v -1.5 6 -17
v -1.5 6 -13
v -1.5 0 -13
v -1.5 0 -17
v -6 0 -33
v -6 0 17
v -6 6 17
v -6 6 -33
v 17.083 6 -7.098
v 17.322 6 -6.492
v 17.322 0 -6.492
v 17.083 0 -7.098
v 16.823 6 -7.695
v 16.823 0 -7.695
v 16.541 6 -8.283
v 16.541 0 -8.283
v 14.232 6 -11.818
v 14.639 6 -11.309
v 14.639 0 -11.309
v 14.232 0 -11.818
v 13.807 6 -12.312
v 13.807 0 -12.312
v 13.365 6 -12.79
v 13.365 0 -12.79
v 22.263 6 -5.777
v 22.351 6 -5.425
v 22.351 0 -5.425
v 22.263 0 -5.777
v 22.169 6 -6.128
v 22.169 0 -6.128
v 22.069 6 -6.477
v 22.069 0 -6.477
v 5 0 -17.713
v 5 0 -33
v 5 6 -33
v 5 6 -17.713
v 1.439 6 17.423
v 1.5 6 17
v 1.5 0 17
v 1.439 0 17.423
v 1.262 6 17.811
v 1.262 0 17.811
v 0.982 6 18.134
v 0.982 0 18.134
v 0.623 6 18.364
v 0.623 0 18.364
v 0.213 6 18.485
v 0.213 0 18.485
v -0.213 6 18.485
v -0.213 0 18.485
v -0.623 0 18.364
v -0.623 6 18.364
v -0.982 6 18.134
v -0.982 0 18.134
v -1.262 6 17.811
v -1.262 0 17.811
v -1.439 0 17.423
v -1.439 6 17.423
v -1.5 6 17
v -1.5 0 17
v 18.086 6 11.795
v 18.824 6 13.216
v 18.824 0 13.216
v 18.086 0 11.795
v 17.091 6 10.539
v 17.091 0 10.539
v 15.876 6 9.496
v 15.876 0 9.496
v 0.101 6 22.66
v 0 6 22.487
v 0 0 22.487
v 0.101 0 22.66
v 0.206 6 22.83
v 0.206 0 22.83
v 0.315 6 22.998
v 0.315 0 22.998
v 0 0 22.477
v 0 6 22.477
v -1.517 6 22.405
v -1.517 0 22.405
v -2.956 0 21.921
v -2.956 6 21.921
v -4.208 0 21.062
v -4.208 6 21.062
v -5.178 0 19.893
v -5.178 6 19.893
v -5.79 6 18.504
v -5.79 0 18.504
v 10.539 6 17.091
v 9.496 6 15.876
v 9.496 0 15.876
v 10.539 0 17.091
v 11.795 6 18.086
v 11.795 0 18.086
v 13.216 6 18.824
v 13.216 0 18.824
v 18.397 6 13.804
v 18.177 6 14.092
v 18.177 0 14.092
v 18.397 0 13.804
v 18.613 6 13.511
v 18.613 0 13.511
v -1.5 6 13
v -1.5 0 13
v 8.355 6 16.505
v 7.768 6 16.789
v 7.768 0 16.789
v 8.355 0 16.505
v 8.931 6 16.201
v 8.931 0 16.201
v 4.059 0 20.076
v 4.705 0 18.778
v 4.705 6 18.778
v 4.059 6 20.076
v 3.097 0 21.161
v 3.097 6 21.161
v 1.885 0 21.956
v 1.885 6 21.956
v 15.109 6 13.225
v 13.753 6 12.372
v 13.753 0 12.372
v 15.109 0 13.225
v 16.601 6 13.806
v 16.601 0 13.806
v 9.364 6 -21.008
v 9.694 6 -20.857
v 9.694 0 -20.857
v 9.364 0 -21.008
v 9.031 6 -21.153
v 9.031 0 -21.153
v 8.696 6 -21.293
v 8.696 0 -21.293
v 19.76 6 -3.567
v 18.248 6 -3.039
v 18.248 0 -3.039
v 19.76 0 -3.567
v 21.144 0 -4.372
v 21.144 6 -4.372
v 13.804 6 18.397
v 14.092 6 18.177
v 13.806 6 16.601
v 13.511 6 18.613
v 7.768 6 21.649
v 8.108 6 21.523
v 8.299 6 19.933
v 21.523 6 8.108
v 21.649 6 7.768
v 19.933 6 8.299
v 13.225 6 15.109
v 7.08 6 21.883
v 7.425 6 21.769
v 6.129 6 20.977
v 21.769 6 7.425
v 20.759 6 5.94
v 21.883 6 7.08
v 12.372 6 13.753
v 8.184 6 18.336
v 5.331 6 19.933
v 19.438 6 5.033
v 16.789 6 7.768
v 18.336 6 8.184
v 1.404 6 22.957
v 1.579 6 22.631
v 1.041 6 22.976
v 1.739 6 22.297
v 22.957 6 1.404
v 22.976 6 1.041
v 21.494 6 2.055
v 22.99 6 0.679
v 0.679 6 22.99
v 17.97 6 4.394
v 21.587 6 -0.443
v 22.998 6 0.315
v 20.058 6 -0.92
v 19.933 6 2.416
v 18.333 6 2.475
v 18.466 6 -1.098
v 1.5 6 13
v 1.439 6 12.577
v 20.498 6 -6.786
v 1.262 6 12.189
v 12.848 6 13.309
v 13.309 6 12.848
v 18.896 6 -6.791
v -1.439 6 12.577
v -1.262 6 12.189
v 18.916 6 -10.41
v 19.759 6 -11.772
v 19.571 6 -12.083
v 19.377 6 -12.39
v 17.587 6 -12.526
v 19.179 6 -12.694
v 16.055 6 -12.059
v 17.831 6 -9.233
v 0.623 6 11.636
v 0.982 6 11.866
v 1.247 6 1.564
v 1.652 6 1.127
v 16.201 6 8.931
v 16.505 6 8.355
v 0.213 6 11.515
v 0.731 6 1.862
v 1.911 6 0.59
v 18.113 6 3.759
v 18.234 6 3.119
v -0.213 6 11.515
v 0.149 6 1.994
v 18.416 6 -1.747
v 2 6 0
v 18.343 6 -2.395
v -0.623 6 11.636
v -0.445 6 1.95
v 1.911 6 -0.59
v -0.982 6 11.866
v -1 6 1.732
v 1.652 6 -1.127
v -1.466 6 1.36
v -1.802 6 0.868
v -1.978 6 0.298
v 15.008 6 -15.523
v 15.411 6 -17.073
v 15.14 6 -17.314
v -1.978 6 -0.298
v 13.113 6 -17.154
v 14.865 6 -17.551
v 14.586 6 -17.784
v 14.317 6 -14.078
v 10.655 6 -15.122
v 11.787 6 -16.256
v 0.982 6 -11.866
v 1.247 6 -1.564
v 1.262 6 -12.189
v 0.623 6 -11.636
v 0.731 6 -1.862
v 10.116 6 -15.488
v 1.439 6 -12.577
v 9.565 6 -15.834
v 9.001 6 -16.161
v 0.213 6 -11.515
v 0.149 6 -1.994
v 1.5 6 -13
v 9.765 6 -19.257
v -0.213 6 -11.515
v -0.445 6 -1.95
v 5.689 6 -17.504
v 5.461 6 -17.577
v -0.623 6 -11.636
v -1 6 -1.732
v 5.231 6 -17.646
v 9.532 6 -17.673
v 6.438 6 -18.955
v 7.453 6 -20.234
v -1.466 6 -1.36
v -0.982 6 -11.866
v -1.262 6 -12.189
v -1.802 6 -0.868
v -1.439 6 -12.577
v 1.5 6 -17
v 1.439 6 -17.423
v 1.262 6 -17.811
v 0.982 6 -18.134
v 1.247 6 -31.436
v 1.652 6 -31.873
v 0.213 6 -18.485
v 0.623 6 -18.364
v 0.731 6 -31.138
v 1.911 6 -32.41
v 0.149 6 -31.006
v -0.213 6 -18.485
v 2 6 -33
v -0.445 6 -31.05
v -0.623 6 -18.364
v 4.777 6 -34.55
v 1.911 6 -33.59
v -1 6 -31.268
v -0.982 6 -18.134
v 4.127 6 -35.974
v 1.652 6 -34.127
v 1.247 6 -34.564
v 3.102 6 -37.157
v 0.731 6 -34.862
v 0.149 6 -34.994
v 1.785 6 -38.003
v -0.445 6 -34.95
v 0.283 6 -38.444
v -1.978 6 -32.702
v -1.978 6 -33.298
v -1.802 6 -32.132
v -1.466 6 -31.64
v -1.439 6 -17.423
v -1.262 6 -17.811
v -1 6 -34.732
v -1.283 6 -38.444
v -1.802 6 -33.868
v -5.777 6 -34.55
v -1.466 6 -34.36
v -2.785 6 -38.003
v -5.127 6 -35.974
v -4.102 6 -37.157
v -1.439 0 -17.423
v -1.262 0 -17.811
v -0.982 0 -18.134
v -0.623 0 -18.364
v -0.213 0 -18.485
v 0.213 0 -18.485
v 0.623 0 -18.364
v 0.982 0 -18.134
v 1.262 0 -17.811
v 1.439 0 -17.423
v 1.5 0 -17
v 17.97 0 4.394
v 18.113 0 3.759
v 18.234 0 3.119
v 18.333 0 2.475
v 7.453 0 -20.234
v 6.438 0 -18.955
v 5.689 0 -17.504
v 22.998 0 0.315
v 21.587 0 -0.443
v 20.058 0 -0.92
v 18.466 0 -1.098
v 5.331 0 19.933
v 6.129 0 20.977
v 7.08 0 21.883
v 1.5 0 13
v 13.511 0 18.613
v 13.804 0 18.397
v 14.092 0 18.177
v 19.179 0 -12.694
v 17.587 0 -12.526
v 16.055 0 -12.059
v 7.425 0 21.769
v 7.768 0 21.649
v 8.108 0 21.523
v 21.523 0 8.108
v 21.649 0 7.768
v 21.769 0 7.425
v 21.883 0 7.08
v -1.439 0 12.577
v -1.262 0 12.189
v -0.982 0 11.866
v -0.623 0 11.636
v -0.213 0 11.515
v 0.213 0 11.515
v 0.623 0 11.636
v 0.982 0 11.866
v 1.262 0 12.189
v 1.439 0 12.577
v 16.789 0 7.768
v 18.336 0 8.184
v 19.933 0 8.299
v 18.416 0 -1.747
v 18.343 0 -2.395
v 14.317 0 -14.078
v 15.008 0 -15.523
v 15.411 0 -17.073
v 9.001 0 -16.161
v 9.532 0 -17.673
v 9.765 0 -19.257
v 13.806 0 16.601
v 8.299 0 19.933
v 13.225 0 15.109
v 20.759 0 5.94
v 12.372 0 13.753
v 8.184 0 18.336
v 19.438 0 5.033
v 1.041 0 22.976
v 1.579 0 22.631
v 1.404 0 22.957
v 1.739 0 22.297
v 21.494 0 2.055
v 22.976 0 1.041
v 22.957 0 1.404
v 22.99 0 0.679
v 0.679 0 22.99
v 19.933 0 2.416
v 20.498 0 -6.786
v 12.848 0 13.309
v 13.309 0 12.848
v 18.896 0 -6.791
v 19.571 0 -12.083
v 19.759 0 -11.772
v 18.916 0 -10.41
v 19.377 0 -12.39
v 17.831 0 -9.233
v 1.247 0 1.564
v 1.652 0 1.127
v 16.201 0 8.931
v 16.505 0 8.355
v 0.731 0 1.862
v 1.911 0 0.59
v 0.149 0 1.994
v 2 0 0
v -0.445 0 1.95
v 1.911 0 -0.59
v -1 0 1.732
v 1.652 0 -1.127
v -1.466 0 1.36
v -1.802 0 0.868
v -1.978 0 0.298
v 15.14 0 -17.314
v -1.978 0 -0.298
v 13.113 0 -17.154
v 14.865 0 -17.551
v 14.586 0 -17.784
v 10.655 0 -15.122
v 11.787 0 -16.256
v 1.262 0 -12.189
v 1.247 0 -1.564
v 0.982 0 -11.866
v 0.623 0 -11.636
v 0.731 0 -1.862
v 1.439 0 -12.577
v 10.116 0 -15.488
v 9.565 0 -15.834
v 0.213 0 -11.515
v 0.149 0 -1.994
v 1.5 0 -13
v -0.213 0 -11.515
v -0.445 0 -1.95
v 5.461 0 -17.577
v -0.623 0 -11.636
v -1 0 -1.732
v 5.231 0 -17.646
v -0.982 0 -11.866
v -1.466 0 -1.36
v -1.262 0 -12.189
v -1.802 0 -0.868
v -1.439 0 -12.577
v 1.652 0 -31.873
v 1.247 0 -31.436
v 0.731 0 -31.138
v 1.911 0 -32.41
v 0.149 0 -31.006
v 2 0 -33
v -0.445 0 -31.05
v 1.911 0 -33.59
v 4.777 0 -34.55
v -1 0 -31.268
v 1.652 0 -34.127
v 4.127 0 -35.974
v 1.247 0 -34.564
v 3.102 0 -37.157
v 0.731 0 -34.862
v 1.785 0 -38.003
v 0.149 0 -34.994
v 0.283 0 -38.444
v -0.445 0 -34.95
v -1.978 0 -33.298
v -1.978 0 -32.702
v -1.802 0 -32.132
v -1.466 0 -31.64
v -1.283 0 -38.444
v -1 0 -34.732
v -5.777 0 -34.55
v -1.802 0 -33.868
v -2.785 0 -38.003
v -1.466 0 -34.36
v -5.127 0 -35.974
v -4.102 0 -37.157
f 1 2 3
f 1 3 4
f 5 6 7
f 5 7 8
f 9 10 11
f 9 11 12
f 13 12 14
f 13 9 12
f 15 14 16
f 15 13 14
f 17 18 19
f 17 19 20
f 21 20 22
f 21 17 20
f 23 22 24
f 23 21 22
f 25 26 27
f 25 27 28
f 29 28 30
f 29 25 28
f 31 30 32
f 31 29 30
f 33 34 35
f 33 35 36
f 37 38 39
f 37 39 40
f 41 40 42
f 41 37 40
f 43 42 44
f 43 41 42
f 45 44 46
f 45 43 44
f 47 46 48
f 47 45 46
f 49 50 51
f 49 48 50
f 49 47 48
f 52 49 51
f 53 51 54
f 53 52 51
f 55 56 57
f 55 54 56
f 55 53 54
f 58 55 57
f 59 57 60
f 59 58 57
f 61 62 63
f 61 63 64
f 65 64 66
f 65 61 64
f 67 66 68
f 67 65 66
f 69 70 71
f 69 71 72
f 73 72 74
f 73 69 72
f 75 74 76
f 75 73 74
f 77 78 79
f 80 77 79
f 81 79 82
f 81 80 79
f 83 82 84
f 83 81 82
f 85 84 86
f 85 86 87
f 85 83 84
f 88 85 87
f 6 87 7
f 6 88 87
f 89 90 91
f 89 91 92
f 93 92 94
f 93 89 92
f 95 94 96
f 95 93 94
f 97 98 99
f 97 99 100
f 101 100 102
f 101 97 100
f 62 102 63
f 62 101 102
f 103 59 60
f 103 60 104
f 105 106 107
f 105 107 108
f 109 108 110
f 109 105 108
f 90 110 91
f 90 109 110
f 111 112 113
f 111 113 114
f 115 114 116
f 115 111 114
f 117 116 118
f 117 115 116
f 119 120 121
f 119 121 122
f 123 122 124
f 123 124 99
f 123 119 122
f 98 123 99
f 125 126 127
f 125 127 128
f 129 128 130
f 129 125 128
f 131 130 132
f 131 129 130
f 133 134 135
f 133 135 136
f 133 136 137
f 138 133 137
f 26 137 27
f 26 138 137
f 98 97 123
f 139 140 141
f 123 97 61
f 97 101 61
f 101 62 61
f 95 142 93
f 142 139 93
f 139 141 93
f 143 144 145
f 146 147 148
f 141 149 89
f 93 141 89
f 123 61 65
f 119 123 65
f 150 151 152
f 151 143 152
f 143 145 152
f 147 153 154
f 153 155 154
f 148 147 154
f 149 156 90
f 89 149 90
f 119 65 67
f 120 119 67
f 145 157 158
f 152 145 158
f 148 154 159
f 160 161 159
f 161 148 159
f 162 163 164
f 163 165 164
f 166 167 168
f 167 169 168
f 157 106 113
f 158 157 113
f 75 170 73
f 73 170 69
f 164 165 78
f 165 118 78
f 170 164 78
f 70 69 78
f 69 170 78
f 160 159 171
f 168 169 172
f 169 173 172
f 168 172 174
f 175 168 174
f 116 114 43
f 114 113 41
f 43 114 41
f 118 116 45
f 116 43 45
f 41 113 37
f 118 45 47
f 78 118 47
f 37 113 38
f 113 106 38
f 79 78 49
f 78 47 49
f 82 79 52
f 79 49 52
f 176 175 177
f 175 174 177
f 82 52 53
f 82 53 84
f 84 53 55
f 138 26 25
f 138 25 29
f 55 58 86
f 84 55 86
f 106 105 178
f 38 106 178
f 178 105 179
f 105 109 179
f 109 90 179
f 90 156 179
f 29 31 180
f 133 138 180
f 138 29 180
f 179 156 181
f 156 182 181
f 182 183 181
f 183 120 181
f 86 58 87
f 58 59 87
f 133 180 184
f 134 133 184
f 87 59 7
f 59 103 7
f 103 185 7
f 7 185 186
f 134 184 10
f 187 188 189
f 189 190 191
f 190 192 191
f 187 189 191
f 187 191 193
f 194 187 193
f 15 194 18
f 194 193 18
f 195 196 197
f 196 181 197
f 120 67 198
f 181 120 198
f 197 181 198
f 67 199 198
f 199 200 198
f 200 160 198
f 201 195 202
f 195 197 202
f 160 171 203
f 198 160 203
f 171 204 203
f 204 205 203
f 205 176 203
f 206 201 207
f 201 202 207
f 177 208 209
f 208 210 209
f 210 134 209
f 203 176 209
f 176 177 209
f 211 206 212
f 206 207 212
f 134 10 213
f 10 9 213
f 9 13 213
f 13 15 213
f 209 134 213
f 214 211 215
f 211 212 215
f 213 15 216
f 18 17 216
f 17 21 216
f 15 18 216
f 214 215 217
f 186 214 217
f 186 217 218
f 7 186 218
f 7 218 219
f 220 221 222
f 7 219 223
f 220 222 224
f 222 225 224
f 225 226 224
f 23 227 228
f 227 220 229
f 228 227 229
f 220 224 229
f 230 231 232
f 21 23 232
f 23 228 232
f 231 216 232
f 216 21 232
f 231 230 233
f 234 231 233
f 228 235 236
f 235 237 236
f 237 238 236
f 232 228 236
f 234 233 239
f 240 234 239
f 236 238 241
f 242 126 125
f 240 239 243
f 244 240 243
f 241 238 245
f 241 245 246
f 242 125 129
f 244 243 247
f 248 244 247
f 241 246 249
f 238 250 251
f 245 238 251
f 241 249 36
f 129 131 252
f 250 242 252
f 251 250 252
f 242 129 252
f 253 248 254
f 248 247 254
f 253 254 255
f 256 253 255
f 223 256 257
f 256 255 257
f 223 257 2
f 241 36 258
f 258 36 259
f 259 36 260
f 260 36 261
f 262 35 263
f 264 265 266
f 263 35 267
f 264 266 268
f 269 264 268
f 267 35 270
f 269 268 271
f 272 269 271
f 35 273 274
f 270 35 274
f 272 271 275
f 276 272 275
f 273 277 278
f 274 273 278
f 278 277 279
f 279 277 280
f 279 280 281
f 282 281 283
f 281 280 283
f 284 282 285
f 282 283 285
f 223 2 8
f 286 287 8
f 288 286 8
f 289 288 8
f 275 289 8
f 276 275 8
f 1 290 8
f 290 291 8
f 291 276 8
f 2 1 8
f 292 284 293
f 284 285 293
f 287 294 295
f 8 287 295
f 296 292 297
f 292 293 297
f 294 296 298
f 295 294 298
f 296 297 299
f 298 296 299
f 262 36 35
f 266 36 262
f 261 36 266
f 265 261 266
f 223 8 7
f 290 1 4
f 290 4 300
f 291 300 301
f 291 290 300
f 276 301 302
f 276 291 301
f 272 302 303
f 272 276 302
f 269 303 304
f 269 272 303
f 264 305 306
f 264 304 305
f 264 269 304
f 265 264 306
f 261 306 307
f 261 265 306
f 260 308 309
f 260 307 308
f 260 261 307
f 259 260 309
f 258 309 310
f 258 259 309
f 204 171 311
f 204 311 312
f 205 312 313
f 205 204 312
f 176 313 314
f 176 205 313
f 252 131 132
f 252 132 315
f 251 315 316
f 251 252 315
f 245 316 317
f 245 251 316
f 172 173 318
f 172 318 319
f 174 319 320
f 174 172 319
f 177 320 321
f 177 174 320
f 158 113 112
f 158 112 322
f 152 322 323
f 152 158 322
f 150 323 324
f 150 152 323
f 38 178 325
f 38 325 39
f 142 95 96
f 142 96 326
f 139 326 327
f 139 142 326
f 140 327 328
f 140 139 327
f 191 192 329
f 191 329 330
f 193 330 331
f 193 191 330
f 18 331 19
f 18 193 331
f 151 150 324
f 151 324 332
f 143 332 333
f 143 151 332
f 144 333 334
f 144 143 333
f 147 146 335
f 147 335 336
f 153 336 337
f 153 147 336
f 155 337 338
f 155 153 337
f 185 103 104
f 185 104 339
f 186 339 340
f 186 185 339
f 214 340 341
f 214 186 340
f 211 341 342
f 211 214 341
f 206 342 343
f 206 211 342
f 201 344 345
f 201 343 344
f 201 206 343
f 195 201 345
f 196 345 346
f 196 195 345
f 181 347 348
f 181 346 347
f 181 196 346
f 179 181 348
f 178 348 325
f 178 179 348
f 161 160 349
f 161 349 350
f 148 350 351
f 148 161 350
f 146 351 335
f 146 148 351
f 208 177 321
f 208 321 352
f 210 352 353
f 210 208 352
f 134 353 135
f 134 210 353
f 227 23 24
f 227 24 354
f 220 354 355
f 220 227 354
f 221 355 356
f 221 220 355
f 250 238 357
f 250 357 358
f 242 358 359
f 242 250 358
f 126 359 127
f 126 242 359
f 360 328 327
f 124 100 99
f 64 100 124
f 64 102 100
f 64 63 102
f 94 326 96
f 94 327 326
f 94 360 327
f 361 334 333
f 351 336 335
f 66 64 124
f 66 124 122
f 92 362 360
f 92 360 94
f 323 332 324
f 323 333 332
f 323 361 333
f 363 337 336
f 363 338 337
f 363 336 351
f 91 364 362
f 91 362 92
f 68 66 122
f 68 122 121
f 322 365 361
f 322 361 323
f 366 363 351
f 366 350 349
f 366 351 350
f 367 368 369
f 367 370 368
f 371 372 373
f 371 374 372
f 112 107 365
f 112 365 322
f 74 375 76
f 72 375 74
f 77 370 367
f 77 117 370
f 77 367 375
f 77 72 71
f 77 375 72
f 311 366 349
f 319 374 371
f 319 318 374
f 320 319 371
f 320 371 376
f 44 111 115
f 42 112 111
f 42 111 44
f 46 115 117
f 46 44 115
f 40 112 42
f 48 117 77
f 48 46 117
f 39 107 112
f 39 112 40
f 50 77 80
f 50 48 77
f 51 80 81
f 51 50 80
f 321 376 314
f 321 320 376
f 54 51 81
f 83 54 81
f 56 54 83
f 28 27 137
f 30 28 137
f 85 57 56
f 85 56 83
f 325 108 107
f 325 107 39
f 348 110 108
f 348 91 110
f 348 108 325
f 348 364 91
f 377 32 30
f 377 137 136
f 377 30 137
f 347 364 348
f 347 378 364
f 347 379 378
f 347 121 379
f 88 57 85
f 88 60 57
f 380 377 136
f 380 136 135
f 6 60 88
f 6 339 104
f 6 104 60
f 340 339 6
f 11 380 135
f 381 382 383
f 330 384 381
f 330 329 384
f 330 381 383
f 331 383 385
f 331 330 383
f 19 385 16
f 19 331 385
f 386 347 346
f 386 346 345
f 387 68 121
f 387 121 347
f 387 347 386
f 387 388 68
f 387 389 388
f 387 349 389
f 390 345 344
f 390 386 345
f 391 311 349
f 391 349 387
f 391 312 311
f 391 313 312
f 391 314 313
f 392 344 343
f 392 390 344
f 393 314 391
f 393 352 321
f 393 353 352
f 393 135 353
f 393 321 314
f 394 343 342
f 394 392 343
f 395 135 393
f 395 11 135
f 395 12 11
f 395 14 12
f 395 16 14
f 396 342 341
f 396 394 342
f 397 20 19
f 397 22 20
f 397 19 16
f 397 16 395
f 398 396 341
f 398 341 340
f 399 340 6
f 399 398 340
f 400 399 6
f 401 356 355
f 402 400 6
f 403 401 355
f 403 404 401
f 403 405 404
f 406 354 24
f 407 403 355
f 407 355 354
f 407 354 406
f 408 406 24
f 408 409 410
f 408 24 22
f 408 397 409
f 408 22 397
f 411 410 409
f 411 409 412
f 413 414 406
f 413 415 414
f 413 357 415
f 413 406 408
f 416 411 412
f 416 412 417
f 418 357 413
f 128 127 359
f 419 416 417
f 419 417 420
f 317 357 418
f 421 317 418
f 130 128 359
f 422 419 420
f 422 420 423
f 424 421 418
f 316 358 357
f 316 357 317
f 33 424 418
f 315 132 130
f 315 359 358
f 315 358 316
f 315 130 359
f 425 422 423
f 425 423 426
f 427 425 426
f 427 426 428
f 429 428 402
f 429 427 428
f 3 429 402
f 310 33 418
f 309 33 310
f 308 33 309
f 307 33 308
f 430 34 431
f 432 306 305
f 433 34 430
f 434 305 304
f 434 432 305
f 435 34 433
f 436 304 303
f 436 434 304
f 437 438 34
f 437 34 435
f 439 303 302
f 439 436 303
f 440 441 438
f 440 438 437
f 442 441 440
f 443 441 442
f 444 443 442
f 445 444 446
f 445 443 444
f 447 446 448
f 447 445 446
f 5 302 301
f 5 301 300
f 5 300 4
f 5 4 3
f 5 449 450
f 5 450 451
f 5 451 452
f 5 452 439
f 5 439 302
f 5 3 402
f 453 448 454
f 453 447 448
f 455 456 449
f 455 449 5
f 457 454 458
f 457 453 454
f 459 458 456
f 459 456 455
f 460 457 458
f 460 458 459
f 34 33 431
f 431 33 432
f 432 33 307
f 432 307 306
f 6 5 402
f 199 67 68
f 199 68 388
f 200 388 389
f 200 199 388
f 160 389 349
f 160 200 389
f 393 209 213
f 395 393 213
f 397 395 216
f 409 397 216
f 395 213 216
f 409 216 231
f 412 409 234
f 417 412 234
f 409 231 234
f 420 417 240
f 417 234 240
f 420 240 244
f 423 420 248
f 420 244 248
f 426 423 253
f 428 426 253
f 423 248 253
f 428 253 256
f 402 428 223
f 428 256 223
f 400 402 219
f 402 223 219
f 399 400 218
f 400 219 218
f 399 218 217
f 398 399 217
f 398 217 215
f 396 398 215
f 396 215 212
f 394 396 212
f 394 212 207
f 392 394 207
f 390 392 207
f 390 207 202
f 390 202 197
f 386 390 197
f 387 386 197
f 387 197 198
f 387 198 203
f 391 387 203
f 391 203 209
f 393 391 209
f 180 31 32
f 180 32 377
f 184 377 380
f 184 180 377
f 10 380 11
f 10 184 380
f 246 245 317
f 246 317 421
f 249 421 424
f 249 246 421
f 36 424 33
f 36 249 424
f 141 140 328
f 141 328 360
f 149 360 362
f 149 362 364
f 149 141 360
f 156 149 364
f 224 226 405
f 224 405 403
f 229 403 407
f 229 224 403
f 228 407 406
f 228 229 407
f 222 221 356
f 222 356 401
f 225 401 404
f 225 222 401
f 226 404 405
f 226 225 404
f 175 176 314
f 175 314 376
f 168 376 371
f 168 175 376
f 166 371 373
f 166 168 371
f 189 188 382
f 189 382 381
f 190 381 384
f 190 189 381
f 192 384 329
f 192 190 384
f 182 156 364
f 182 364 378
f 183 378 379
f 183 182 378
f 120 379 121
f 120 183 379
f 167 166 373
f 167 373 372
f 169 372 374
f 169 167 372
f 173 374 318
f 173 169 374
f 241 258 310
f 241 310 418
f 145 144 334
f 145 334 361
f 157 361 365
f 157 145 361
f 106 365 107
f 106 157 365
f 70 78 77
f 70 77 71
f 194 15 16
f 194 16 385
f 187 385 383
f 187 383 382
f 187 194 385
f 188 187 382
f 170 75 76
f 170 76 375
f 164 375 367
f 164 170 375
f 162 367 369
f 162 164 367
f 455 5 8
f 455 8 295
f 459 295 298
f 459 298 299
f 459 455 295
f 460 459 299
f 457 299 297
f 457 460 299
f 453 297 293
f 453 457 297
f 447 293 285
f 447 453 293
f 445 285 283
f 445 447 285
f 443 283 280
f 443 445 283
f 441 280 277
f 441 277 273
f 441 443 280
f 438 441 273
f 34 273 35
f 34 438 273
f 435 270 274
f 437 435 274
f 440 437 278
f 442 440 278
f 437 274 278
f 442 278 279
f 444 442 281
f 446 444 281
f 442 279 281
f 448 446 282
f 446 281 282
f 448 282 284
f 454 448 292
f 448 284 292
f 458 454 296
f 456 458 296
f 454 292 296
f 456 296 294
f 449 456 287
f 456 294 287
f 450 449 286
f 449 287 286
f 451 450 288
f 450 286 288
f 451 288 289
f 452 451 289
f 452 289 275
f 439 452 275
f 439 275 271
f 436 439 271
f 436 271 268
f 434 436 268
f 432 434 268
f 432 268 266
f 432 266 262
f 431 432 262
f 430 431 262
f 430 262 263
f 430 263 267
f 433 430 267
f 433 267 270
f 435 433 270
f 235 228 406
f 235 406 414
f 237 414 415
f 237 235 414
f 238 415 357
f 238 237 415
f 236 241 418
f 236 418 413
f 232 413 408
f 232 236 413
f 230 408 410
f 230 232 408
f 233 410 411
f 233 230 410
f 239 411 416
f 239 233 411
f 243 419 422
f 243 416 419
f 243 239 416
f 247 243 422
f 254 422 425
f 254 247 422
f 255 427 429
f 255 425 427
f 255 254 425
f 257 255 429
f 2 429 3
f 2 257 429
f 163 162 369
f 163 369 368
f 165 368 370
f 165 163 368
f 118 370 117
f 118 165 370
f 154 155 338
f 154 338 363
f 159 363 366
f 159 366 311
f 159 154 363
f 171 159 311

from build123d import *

# Parameters (mm, degrees)
BOSS_EXTRUDE1_DEPTH = 6
BOSS_EXTRUDE2_DEPTH = 6
SKETCH2_R           = 2
CUT_EXTRUDE1_DEPTH  = 7


with BuildPart() as part:
    # Sketch1 → Boss-Extrude1 (new body)
    with BuildSketch(Plane(origin=(0, 0, 0), x_dir=(1, 0, 0), z_dir=(0, 1, 0))):
        with BuildLine():
            Line((5, 33), (5, 0))
            Line((5, 0), (5, -17))
            ThreePointArc((5, -17), (-0.5, -22.5), (-6, -17))
            Line((-6, -17), (-6, 0))
            Line((-6, 0), (-6, 33))
            ThreePointArc((-6, 33), (-0.5, 38.5), (5, 33))
        make_face()
    extrude(amount=BOSS_EXTRUDE1_DEPTH)

    # Sketch4 → Boss-Extrude2 (add)
    with BuildSketch(Plane(origin=(0, 6, 0), x_dir=(1, 0, 0), z_dir=(0, 1, 0))):
        with BuildLine():
            Line((0, 18.405260039), (0, -22.486700485))
            ThreePointArc((0, -22.486700485), (0.153171428, -22.74508915), (0.315483204, -22.99783621))
            ThreePointArc((0.315483204, -22.99783621), (0.859997468, -22.98391621), (1.404029403, -22.957105685))
            ThreePointArc((1.404029403, -22.957105685), (2.272765962, -20.722115477), (2.474630782, -18.332735843))
            ThreePointArc((2.474630782, -18.332735843), (3.439178821, -18.176497188), (4.39413166, -17.969546682))
            ThreePointArc((4.39413166, -17.969546682), (5.454980724, -20.120007959), (7.080198393, -21.883116568))
            ThreePointArc((7.080198393, -21.883116568), (7.596418425, -21.709316597), (8.108378007, -21.52334096))
            ThreePointArc((8.108378007, -21.52334096), (8.279744109, -19.1315805), (7.76835863, -16.7888536))
            ThreePointArc((7.76835863, -16.7888536), (8.644002354, -16.355250664), (9.495529586, -15.876017098))
            ThreePointArc((9.495529586, -15.876017098), (11.143107691, -17.618248663), (13.215806885, -18.823985986))
            ThreePointArc((13.215806885, -18.823985986), (13.657864268, -18.505748935), (14.092261641, -18.177132938))
            ThreePointArc((14.092261641, -18.177132938), (13.551030657, -15.841120639), (12.371833724, -13.753208037))
            ThreePointArc((12.371833724, -13.753208037), (13.080768345, -13.080768345), (13.753208037, -12.371833724))
            ThreePointArc((13.753208037, -12.371833724), (15.841120639, -13.551030657), (18.177132938, -14.092261641))
            ThreePointArc((18.177132938, -14.092261641), (18.505748935, -13.657864268), (18.823985986, -13.215806885))
            ThreePointArc((18.823985986, -13.215806885), (17.618248663, -11.143107691), (15.876017098, -9.495529586))
            ThreePointArc((15.876017098, -9.495529586), (16.355250664, -8.644002354), (16.7888536, -7.76835863))
            ThreePointArc((16.7888536, -7.76835863), (19.1315805, -8.279744109), (21.52334096, -8.108378007))
            ThreePointArc((21.52334096, -8.108378007), (21.709316597, -7.596418425), (21.883116568, -7.080198393))
            ThreePointArc((21.883116568, -7.080198393), (20.120007959, -5.454980724), (17.969546682, -4.39413166))
            ThreePointArc((17.969546682, -4.39413166), (18.176497188, -3.439178821), (18.332735843, -2.474630782))
            ThreePointArc((18.332735843, -2.474630782), (20.722115477, -2.272765962), (22.957105685, -1.404029403))
            ThreePointArc((22.957105685, -1.404029403), (22.98391621, -0.859997468), (22.99783621, -0.315483204))
            ThreePointArc((22.99783621, -0.315483204), (20.834016252, 0.717845219), (18.466403185, 1.097704147))
            ThreePointArc((18.466403185, 1.097704147), (18.382682171, 2.071230843), (18.247674055, 3.038978872))
            ThreePointArc((18.247674055, 3.038978872), (20.471399556, 3.936157414), (22.351030824, 5.425073374))
            ThreePointArc((22.351030824, 5.425073374), (22.216294005, 5.952838037), (22.069097181, 6.477264053))
            ThreePointArc((22.069097181, 6.477264053), (19.696830773, 6.826887464), (17.322438727, 6.492004123))
            ThreePointArc((17.322438727, 6.492004123), (16.955485171, 7.397602558), (16.541226348, 8.282561916))
            ThreePointArc((16.541226348, 8.282561916), (18.401709947, 9.795335931), (19.758968788, 11.772134574))
            ThreePointArc((19.758968788, 11.772134574), (19.474656582, 12.23673776), (19.179422019, 12.694477974))
            ThreePointArc((19.179422019, 12.694477974), (16.809495442, 12.329330799), (14.63929957, 11.309461043))
            ThreePointArc((14.63929957, 11.309461043), (14.021718906, 12.066664821), (13.365018091, 12.790202986))
            ThreePointArc((13.365018091, 12.790202986), (14.696947654, 14.784155864), (15.411235665, 17.073189956))
            ThreePointArc((15.411235665, 17.073189956), (15.002610459, 17.433349632), (14.585571043, 17.783731818))
            ThreePointArc((14.585571043, 17.783731818), (12.428562673, 16.736258985), (10.655394403, 15.122022719))
            ThreePointArc((10.655394403, 15.122022719), (9.842061383, 15.663550962), (9.001269325, 16.161378393))
            ThreePointArc((9.001269325, 16.161378393), (9.686297066, 18.459338669), (9.694146621, 20.857217487))
            ThreePointArc((9.694146621, 20.857217487), (9.197516559, 21.080931885), (8.695728072, 21.292823047))
            ThreePointArc((8.695728072, 21.292823047), (6.913991789, 19.619372088), (5.689483487, 17.503810292))
            ThreePointArc((5.689483487, 17.503810292), (2.880227161, 18.178500725), (0, 18.405260039))
        make_face()
    extrude(amount=-BOSS_EXTRUDE2_DEPTH)

    # Sketch2 → Cut-Extrude1 (cut, through all)
    with BuildSketch(Plane(origin=(0, 6, 0), x_dir=(1, 0, 0), z_dir=(0, 1, 0))):
        Circle(SKETCH2_R)
        with Locations((0, 33)):
            Circle(SKETCH2_R)
        with BuildLine():
            Line((1.5, 17), (1.5, 13))
            ThreePointArc((1.5, 13), (0, 11.5), (-1.5, 13))
            Line((-1.5, 13), (-1.5, 17))
            ThreePointArc((-1.5, 17), (0, 18.5), (1.5, 17))
        make_face()
        with BuildLine():
            Line((-1.5, -17), (-1.5, -13))
            ThreePointArc((-1.5, -13), (0, -11.5), (1.5, -13))
            Line((1.5, -13), (1.5, -17))
            ThreePointArc((1.5, -17), (0, -18.5), (-1.5, -17))
        make_face()
    extrude(amount=-CUT_EXTRUDE1_DEPTH, mode=Mode.SUBTRACT)


solid = part.part
